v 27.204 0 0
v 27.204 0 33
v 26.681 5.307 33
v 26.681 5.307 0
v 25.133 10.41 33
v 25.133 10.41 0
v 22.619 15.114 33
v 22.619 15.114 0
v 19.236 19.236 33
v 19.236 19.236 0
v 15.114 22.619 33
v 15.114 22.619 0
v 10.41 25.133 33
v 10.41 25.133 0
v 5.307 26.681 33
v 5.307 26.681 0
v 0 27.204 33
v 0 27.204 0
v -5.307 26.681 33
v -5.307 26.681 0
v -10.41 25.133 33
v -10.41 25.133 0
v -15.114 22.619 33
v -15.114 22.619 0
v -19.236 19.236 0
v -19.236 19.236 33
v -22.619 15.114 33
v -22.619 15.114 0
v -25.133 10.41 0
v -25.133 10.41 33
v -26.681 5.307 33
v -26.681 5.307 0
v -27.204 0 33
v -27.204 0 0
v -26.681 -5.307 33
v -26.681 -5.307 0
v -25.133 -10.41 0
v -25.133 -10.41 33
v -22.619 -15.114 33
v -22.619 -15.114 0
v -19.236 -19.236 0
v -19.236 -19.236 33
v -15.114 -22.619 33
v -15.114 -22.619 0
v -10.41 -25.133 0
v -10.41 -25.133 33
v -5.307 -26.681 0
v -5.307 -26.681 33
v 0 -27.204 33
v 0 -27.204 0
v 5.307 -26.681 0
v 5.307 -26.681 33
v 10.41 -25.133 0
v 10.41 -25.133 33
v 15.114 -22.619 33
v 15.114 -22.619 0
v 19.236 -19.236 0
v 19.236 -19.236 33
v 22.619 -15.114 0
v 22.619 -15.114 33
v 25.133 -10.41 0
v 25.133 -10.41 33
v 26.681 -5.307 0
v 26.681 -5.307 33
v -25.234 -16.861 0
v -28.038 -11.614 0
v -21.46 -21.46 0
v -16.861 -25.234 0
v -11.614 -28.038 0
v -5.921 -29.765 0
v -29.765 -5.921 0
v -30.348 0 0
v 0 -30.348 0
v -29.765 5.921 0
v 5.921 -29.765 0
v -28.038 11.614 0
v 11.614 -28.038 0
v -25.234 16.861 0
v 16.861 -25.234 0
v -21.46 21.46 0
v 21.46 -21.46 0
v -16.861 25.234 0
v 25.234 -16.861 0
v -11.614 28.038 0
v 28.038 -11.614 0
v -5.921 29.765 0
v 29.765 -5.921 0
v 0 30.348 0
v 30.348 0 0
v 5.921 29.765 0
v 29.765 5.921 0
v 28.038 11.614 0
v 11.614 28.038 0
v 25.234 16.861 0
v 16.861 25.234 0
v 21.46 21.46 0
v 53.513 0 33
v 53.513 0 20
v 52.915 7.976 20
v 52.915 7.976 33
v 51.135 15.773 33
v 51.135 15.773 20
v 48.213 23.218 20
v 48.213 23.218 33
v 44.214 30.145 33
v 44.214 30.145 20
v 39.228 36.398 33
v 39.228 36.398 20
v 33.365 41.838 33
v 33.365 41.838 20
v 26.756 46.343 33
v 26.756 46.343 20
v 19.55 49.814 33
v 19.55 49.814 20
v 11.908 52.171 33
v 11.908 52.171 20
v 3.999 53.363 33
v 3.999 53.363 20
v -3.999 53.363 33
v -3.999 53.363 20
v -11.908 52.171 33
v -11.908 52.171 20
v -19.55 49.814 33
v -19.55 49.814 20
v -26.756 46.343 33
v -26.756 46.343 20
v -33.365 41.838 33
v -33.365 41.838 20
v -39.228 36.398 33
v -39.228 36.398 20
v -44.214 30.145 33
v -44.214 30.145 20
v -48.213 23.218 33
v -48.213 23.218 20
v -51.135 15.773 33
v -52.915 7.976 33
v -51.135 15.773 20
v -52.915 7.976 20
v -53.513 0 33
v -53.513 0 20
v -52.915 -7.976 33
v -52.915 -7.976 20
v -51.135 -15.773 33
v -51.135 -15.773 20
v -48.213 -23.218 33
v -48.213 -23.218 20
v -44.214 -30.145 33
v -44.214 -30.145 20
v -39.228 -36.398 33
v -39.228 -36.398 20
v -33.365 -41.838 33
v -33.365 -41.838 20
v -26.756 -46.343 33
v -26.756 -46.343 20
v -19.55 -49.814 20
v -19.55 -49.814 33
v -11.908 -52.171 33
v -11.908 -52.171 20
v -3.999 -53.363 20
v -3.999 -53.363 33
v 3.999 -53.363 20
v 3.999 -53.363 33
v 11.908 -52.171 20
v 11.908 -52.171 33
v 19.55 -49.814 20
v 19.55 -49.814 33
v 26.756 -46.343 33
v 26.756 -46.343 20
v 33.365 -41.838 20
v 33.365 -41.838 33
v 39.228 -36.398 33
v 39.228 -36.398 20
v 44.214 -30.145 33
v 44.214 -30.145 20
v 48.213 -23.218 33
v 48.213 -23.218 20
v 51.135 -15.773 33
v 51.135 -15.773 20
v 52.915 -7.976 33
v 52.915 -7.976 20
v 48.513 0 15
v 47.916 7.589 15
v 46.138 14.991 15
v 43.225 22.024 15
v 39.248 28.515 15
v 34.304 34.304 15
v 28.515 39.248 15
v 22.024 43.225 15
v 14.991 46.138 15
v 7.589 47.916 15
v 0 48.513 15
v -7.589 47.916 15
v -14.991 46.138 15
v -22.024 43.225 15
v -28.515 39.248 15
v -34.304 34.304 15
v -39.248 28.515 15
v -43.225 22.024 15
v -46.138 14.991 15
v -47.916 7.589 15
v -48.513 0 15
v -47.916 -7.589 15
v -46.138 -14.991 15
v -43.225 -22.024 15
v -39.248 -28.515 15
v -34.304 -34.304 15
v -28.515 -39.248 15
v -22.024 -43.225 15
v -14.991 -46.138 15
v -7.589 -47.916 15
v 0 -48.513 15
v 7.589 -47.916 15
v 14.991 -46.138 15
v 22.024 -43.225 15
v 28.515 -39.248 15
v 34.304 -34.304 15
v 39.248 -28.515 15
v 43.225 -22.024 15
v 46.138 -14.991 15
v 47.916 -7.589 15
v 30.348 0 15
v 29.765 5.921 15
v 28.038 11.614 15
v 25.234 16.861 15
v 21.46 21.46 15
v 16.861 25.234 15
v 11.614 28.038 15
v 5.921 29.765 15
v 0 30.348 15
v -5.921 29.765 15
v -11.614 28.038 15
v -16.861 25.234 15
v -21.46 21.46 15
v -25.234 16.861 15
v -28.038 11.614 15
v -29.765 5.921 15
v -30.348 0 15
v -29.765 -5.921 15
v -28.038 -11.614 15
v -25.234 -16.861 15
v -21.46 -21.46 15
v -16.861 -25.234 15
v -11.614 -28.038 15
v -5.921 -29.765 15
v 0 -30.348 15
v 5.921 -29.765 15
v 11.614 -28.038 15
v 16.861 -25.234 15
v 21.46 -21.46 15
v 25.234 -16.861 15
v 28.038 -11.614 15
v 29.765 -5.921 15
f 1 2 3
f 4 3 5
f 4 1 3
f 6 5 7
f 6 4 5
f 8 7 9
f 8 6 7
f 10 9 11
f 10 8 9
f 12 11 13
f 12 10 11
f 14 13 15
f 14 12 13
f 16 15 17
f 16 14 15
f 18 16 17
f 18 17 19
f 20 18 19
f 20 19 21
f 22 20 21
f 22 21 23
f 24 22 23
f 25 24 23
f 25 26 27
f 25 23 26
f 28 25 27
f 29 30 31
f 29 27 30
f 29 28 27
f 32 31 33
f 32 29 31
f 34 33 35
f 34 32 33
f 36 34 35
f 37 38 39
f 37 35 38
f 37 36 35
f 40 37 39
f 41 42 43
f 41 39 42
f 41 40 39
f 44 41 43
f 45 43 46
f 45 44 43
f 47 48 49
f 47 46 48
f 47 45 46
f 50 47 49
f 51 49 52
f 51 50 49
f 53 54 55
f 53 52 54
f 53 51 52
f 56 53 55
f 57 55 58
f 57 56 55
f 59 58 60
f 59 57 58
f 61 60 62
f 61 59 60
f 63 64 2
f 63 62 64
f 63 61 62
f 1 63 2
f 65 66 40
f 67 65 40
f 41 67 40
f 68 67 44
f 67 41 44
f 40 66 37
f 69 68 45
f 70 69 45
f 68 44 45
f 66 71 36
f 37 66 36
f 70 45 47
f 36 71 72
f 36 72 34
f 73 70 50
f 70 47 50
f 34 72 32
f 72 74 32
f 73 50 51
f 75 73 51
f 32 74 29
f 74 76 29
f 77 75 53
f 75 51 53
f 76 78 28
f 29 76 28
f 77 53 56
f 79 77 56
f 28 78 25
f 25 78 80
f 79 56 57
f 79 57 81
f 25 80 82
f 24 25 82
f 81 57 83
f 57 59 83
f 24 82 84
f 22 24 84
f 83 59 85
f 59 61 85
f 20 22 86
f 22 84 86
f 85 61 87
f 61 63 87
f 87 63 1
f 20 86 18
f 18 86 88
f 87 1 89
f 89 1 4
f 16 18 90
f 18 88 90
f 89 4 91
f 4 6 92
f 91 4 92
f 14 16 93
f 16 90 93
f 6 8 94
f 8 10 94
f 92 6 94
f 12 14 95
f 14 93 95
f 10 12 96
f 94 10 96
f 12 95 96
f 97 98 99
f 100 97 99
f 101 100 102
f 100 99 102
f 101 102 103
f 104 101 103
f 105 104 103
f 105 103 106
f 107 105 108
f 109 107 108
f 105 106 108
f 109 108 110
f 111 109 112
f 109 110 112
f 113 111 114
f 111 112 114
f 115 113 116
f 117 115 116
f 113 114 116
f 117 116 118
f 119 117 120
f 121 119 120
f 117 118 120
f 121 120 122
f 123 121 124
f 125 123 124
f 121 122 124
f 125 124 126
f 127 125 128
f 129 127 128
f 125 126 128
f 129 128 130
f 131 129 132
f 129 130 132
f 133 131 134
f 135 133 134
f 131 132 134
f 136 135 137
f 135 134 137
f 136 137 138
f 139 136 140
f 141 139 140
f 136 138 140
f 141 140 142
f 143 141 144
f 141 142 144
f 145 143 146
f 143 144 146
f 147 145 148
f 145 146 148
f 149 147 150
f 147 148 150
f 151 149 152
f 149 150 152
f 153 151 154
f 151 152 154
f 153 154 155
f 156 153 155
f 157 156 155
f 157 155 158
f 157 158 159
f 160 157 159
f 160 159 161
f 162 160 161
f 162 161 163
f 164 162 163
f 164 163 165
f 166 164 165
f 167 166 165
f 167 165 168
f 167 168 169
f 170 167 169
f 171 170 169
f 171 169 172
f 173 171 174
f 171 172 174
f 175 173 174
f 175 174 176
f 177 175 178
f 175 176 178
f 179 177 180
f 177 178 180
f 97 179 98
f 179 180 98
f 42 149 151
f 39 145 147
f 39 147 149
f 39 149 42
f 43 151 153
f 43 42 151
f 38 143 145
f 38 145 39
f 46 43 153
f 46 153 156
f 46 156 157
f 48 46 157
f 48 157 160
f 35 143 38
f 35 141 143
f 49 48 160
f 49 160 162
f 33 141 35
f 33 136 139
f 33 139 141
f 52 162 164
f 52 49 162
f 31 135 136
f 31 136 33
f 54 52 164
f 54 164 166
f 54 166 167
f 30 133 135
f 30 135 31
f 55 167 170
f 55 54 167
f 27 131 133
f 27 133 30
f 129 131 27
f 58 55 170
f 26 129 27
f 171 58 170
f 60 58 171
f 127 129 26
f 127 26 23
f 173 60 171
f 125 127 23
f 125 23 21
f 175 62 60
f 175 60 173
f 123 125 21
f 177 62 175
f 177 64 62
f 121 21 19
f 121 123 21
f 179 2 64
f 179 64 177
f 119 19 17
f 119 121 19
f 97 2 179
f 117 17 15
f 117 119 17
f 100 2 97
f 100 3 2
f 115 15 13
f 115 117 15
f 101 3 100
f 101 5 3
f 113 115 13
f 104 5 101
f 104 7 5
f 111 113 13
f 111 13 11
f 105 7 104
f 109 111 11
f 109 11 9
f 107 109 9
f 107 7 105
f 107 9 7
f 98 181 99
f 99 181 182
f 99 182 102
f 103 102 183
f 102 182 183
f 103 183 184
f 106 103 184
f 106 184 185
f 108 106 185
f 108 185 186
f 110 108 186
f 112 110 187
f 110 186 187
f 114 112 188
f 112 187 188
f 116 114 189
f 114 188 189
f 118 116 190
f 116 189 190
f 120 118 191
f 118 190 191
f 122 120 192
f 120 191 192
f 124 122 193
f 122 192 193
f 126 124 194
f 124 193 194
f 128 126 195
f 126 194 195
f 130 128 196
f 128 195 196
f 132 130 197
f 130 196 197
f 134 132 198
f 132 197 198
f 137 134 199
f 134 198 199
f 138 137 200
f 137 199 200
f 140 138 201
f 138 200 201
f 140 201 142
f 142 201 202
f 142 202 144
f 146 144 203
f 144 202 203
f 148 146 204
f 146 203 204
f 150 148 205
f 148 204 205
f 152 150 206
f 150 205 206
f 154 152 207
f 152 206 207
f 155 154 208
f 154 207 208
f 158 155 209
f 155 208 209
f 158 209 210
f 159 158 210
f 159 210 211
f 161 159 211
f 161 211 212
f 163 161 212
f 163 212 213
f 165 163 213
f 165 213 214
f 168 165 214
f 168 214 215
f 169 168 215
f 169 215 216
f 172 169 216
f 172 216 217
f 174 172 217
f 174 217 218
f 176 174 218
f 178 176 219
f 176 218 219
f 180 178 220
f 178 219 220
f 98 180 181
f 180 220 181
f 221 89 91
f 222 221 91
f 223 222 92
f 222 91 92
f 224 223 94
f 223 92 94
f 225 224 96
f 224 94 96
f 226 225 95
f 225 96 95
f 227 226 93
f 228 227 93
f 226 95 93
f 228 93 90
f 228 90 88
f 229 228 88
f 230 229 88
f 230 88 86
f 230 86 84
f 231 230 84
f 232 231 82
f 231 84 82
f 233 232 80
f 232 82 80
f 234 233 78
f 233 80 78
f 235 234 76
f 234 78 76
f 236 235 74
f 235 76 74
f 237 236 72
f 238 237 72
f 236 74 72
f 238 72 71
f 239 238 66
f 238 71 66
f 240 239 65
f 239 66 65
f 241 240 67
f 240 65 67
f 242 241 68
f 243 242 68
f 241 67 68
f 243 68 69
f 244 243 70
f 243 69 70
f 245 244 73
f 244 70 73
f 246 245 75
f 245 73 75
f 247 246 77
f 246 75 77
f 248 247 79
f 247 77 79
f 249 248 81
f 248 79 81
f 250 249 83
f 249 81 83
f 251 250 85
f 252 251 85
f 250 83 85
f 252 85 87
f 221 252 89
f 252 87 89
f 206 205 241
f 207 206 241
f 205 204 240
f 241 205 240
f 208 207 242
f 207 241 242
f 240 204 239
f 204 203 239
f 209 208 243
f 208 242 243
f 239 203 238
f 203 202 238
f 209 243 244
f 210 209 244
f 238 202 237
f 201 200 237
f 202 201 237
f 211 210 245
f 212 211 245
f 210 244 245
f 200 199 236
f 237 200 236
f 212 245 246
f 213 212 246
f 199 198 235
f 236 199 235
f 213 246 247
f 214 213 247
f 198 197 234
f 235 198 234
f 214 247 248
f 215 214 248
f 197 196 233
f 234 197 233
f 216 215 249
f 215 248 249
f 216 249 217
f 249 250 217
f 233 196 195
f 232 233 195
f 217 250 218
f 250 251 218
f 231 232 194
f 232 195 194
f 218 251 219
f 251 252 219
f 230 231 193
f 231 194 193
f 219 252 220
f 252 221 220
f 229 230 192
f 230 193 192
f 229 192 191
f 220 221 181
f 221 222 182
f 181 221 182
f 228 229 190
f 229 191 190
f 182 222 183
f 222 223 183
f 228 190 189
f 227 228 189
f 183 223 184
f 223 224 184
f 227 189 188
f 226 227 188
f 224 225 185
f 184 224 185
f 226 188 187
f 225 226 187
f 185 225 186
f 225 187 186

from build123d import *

# Parameters (mm, degrees)
F0_R     = 30.348446
F0_R_2   = 27.203675
F1_DEPTH = 15
F2_R     = 53.512853
F3_DEPTH = 18
F4_DEPTH = 81.4
F5_SIZE  = 5


with BuildPart() as f1:
    # F0 (on Top) → F1 (new body)
    with BuildSketch(Plane.XY):
        Circle(F0_R)
        Circle(F0_R_2, mode=Mode.SUBTRACT)
    extrude(amount=F1_DEPTH)

    # F2 (on face) → F3 (join)
    with BuildSketch(Plane.XY.offset(15)):
        Circle(F2_R)
    extrude(amount=F3_DEPTH)

    # F0 (on Top) → F4 (cut)
    with BuildSketch(Plane.XY):
        Circle(F0_R_2)
    extrude(amount=F4_DEPTH, mode=Mode.SUBTRACT)

    # F5
    f5_edges = [f1.edges().sort_by_distance(p)[0] for p in [
        (-53.512853, 0, 15),
    ]]
    chamfer(f5_edges, length=F5_SIZE)


solid = f1.part
